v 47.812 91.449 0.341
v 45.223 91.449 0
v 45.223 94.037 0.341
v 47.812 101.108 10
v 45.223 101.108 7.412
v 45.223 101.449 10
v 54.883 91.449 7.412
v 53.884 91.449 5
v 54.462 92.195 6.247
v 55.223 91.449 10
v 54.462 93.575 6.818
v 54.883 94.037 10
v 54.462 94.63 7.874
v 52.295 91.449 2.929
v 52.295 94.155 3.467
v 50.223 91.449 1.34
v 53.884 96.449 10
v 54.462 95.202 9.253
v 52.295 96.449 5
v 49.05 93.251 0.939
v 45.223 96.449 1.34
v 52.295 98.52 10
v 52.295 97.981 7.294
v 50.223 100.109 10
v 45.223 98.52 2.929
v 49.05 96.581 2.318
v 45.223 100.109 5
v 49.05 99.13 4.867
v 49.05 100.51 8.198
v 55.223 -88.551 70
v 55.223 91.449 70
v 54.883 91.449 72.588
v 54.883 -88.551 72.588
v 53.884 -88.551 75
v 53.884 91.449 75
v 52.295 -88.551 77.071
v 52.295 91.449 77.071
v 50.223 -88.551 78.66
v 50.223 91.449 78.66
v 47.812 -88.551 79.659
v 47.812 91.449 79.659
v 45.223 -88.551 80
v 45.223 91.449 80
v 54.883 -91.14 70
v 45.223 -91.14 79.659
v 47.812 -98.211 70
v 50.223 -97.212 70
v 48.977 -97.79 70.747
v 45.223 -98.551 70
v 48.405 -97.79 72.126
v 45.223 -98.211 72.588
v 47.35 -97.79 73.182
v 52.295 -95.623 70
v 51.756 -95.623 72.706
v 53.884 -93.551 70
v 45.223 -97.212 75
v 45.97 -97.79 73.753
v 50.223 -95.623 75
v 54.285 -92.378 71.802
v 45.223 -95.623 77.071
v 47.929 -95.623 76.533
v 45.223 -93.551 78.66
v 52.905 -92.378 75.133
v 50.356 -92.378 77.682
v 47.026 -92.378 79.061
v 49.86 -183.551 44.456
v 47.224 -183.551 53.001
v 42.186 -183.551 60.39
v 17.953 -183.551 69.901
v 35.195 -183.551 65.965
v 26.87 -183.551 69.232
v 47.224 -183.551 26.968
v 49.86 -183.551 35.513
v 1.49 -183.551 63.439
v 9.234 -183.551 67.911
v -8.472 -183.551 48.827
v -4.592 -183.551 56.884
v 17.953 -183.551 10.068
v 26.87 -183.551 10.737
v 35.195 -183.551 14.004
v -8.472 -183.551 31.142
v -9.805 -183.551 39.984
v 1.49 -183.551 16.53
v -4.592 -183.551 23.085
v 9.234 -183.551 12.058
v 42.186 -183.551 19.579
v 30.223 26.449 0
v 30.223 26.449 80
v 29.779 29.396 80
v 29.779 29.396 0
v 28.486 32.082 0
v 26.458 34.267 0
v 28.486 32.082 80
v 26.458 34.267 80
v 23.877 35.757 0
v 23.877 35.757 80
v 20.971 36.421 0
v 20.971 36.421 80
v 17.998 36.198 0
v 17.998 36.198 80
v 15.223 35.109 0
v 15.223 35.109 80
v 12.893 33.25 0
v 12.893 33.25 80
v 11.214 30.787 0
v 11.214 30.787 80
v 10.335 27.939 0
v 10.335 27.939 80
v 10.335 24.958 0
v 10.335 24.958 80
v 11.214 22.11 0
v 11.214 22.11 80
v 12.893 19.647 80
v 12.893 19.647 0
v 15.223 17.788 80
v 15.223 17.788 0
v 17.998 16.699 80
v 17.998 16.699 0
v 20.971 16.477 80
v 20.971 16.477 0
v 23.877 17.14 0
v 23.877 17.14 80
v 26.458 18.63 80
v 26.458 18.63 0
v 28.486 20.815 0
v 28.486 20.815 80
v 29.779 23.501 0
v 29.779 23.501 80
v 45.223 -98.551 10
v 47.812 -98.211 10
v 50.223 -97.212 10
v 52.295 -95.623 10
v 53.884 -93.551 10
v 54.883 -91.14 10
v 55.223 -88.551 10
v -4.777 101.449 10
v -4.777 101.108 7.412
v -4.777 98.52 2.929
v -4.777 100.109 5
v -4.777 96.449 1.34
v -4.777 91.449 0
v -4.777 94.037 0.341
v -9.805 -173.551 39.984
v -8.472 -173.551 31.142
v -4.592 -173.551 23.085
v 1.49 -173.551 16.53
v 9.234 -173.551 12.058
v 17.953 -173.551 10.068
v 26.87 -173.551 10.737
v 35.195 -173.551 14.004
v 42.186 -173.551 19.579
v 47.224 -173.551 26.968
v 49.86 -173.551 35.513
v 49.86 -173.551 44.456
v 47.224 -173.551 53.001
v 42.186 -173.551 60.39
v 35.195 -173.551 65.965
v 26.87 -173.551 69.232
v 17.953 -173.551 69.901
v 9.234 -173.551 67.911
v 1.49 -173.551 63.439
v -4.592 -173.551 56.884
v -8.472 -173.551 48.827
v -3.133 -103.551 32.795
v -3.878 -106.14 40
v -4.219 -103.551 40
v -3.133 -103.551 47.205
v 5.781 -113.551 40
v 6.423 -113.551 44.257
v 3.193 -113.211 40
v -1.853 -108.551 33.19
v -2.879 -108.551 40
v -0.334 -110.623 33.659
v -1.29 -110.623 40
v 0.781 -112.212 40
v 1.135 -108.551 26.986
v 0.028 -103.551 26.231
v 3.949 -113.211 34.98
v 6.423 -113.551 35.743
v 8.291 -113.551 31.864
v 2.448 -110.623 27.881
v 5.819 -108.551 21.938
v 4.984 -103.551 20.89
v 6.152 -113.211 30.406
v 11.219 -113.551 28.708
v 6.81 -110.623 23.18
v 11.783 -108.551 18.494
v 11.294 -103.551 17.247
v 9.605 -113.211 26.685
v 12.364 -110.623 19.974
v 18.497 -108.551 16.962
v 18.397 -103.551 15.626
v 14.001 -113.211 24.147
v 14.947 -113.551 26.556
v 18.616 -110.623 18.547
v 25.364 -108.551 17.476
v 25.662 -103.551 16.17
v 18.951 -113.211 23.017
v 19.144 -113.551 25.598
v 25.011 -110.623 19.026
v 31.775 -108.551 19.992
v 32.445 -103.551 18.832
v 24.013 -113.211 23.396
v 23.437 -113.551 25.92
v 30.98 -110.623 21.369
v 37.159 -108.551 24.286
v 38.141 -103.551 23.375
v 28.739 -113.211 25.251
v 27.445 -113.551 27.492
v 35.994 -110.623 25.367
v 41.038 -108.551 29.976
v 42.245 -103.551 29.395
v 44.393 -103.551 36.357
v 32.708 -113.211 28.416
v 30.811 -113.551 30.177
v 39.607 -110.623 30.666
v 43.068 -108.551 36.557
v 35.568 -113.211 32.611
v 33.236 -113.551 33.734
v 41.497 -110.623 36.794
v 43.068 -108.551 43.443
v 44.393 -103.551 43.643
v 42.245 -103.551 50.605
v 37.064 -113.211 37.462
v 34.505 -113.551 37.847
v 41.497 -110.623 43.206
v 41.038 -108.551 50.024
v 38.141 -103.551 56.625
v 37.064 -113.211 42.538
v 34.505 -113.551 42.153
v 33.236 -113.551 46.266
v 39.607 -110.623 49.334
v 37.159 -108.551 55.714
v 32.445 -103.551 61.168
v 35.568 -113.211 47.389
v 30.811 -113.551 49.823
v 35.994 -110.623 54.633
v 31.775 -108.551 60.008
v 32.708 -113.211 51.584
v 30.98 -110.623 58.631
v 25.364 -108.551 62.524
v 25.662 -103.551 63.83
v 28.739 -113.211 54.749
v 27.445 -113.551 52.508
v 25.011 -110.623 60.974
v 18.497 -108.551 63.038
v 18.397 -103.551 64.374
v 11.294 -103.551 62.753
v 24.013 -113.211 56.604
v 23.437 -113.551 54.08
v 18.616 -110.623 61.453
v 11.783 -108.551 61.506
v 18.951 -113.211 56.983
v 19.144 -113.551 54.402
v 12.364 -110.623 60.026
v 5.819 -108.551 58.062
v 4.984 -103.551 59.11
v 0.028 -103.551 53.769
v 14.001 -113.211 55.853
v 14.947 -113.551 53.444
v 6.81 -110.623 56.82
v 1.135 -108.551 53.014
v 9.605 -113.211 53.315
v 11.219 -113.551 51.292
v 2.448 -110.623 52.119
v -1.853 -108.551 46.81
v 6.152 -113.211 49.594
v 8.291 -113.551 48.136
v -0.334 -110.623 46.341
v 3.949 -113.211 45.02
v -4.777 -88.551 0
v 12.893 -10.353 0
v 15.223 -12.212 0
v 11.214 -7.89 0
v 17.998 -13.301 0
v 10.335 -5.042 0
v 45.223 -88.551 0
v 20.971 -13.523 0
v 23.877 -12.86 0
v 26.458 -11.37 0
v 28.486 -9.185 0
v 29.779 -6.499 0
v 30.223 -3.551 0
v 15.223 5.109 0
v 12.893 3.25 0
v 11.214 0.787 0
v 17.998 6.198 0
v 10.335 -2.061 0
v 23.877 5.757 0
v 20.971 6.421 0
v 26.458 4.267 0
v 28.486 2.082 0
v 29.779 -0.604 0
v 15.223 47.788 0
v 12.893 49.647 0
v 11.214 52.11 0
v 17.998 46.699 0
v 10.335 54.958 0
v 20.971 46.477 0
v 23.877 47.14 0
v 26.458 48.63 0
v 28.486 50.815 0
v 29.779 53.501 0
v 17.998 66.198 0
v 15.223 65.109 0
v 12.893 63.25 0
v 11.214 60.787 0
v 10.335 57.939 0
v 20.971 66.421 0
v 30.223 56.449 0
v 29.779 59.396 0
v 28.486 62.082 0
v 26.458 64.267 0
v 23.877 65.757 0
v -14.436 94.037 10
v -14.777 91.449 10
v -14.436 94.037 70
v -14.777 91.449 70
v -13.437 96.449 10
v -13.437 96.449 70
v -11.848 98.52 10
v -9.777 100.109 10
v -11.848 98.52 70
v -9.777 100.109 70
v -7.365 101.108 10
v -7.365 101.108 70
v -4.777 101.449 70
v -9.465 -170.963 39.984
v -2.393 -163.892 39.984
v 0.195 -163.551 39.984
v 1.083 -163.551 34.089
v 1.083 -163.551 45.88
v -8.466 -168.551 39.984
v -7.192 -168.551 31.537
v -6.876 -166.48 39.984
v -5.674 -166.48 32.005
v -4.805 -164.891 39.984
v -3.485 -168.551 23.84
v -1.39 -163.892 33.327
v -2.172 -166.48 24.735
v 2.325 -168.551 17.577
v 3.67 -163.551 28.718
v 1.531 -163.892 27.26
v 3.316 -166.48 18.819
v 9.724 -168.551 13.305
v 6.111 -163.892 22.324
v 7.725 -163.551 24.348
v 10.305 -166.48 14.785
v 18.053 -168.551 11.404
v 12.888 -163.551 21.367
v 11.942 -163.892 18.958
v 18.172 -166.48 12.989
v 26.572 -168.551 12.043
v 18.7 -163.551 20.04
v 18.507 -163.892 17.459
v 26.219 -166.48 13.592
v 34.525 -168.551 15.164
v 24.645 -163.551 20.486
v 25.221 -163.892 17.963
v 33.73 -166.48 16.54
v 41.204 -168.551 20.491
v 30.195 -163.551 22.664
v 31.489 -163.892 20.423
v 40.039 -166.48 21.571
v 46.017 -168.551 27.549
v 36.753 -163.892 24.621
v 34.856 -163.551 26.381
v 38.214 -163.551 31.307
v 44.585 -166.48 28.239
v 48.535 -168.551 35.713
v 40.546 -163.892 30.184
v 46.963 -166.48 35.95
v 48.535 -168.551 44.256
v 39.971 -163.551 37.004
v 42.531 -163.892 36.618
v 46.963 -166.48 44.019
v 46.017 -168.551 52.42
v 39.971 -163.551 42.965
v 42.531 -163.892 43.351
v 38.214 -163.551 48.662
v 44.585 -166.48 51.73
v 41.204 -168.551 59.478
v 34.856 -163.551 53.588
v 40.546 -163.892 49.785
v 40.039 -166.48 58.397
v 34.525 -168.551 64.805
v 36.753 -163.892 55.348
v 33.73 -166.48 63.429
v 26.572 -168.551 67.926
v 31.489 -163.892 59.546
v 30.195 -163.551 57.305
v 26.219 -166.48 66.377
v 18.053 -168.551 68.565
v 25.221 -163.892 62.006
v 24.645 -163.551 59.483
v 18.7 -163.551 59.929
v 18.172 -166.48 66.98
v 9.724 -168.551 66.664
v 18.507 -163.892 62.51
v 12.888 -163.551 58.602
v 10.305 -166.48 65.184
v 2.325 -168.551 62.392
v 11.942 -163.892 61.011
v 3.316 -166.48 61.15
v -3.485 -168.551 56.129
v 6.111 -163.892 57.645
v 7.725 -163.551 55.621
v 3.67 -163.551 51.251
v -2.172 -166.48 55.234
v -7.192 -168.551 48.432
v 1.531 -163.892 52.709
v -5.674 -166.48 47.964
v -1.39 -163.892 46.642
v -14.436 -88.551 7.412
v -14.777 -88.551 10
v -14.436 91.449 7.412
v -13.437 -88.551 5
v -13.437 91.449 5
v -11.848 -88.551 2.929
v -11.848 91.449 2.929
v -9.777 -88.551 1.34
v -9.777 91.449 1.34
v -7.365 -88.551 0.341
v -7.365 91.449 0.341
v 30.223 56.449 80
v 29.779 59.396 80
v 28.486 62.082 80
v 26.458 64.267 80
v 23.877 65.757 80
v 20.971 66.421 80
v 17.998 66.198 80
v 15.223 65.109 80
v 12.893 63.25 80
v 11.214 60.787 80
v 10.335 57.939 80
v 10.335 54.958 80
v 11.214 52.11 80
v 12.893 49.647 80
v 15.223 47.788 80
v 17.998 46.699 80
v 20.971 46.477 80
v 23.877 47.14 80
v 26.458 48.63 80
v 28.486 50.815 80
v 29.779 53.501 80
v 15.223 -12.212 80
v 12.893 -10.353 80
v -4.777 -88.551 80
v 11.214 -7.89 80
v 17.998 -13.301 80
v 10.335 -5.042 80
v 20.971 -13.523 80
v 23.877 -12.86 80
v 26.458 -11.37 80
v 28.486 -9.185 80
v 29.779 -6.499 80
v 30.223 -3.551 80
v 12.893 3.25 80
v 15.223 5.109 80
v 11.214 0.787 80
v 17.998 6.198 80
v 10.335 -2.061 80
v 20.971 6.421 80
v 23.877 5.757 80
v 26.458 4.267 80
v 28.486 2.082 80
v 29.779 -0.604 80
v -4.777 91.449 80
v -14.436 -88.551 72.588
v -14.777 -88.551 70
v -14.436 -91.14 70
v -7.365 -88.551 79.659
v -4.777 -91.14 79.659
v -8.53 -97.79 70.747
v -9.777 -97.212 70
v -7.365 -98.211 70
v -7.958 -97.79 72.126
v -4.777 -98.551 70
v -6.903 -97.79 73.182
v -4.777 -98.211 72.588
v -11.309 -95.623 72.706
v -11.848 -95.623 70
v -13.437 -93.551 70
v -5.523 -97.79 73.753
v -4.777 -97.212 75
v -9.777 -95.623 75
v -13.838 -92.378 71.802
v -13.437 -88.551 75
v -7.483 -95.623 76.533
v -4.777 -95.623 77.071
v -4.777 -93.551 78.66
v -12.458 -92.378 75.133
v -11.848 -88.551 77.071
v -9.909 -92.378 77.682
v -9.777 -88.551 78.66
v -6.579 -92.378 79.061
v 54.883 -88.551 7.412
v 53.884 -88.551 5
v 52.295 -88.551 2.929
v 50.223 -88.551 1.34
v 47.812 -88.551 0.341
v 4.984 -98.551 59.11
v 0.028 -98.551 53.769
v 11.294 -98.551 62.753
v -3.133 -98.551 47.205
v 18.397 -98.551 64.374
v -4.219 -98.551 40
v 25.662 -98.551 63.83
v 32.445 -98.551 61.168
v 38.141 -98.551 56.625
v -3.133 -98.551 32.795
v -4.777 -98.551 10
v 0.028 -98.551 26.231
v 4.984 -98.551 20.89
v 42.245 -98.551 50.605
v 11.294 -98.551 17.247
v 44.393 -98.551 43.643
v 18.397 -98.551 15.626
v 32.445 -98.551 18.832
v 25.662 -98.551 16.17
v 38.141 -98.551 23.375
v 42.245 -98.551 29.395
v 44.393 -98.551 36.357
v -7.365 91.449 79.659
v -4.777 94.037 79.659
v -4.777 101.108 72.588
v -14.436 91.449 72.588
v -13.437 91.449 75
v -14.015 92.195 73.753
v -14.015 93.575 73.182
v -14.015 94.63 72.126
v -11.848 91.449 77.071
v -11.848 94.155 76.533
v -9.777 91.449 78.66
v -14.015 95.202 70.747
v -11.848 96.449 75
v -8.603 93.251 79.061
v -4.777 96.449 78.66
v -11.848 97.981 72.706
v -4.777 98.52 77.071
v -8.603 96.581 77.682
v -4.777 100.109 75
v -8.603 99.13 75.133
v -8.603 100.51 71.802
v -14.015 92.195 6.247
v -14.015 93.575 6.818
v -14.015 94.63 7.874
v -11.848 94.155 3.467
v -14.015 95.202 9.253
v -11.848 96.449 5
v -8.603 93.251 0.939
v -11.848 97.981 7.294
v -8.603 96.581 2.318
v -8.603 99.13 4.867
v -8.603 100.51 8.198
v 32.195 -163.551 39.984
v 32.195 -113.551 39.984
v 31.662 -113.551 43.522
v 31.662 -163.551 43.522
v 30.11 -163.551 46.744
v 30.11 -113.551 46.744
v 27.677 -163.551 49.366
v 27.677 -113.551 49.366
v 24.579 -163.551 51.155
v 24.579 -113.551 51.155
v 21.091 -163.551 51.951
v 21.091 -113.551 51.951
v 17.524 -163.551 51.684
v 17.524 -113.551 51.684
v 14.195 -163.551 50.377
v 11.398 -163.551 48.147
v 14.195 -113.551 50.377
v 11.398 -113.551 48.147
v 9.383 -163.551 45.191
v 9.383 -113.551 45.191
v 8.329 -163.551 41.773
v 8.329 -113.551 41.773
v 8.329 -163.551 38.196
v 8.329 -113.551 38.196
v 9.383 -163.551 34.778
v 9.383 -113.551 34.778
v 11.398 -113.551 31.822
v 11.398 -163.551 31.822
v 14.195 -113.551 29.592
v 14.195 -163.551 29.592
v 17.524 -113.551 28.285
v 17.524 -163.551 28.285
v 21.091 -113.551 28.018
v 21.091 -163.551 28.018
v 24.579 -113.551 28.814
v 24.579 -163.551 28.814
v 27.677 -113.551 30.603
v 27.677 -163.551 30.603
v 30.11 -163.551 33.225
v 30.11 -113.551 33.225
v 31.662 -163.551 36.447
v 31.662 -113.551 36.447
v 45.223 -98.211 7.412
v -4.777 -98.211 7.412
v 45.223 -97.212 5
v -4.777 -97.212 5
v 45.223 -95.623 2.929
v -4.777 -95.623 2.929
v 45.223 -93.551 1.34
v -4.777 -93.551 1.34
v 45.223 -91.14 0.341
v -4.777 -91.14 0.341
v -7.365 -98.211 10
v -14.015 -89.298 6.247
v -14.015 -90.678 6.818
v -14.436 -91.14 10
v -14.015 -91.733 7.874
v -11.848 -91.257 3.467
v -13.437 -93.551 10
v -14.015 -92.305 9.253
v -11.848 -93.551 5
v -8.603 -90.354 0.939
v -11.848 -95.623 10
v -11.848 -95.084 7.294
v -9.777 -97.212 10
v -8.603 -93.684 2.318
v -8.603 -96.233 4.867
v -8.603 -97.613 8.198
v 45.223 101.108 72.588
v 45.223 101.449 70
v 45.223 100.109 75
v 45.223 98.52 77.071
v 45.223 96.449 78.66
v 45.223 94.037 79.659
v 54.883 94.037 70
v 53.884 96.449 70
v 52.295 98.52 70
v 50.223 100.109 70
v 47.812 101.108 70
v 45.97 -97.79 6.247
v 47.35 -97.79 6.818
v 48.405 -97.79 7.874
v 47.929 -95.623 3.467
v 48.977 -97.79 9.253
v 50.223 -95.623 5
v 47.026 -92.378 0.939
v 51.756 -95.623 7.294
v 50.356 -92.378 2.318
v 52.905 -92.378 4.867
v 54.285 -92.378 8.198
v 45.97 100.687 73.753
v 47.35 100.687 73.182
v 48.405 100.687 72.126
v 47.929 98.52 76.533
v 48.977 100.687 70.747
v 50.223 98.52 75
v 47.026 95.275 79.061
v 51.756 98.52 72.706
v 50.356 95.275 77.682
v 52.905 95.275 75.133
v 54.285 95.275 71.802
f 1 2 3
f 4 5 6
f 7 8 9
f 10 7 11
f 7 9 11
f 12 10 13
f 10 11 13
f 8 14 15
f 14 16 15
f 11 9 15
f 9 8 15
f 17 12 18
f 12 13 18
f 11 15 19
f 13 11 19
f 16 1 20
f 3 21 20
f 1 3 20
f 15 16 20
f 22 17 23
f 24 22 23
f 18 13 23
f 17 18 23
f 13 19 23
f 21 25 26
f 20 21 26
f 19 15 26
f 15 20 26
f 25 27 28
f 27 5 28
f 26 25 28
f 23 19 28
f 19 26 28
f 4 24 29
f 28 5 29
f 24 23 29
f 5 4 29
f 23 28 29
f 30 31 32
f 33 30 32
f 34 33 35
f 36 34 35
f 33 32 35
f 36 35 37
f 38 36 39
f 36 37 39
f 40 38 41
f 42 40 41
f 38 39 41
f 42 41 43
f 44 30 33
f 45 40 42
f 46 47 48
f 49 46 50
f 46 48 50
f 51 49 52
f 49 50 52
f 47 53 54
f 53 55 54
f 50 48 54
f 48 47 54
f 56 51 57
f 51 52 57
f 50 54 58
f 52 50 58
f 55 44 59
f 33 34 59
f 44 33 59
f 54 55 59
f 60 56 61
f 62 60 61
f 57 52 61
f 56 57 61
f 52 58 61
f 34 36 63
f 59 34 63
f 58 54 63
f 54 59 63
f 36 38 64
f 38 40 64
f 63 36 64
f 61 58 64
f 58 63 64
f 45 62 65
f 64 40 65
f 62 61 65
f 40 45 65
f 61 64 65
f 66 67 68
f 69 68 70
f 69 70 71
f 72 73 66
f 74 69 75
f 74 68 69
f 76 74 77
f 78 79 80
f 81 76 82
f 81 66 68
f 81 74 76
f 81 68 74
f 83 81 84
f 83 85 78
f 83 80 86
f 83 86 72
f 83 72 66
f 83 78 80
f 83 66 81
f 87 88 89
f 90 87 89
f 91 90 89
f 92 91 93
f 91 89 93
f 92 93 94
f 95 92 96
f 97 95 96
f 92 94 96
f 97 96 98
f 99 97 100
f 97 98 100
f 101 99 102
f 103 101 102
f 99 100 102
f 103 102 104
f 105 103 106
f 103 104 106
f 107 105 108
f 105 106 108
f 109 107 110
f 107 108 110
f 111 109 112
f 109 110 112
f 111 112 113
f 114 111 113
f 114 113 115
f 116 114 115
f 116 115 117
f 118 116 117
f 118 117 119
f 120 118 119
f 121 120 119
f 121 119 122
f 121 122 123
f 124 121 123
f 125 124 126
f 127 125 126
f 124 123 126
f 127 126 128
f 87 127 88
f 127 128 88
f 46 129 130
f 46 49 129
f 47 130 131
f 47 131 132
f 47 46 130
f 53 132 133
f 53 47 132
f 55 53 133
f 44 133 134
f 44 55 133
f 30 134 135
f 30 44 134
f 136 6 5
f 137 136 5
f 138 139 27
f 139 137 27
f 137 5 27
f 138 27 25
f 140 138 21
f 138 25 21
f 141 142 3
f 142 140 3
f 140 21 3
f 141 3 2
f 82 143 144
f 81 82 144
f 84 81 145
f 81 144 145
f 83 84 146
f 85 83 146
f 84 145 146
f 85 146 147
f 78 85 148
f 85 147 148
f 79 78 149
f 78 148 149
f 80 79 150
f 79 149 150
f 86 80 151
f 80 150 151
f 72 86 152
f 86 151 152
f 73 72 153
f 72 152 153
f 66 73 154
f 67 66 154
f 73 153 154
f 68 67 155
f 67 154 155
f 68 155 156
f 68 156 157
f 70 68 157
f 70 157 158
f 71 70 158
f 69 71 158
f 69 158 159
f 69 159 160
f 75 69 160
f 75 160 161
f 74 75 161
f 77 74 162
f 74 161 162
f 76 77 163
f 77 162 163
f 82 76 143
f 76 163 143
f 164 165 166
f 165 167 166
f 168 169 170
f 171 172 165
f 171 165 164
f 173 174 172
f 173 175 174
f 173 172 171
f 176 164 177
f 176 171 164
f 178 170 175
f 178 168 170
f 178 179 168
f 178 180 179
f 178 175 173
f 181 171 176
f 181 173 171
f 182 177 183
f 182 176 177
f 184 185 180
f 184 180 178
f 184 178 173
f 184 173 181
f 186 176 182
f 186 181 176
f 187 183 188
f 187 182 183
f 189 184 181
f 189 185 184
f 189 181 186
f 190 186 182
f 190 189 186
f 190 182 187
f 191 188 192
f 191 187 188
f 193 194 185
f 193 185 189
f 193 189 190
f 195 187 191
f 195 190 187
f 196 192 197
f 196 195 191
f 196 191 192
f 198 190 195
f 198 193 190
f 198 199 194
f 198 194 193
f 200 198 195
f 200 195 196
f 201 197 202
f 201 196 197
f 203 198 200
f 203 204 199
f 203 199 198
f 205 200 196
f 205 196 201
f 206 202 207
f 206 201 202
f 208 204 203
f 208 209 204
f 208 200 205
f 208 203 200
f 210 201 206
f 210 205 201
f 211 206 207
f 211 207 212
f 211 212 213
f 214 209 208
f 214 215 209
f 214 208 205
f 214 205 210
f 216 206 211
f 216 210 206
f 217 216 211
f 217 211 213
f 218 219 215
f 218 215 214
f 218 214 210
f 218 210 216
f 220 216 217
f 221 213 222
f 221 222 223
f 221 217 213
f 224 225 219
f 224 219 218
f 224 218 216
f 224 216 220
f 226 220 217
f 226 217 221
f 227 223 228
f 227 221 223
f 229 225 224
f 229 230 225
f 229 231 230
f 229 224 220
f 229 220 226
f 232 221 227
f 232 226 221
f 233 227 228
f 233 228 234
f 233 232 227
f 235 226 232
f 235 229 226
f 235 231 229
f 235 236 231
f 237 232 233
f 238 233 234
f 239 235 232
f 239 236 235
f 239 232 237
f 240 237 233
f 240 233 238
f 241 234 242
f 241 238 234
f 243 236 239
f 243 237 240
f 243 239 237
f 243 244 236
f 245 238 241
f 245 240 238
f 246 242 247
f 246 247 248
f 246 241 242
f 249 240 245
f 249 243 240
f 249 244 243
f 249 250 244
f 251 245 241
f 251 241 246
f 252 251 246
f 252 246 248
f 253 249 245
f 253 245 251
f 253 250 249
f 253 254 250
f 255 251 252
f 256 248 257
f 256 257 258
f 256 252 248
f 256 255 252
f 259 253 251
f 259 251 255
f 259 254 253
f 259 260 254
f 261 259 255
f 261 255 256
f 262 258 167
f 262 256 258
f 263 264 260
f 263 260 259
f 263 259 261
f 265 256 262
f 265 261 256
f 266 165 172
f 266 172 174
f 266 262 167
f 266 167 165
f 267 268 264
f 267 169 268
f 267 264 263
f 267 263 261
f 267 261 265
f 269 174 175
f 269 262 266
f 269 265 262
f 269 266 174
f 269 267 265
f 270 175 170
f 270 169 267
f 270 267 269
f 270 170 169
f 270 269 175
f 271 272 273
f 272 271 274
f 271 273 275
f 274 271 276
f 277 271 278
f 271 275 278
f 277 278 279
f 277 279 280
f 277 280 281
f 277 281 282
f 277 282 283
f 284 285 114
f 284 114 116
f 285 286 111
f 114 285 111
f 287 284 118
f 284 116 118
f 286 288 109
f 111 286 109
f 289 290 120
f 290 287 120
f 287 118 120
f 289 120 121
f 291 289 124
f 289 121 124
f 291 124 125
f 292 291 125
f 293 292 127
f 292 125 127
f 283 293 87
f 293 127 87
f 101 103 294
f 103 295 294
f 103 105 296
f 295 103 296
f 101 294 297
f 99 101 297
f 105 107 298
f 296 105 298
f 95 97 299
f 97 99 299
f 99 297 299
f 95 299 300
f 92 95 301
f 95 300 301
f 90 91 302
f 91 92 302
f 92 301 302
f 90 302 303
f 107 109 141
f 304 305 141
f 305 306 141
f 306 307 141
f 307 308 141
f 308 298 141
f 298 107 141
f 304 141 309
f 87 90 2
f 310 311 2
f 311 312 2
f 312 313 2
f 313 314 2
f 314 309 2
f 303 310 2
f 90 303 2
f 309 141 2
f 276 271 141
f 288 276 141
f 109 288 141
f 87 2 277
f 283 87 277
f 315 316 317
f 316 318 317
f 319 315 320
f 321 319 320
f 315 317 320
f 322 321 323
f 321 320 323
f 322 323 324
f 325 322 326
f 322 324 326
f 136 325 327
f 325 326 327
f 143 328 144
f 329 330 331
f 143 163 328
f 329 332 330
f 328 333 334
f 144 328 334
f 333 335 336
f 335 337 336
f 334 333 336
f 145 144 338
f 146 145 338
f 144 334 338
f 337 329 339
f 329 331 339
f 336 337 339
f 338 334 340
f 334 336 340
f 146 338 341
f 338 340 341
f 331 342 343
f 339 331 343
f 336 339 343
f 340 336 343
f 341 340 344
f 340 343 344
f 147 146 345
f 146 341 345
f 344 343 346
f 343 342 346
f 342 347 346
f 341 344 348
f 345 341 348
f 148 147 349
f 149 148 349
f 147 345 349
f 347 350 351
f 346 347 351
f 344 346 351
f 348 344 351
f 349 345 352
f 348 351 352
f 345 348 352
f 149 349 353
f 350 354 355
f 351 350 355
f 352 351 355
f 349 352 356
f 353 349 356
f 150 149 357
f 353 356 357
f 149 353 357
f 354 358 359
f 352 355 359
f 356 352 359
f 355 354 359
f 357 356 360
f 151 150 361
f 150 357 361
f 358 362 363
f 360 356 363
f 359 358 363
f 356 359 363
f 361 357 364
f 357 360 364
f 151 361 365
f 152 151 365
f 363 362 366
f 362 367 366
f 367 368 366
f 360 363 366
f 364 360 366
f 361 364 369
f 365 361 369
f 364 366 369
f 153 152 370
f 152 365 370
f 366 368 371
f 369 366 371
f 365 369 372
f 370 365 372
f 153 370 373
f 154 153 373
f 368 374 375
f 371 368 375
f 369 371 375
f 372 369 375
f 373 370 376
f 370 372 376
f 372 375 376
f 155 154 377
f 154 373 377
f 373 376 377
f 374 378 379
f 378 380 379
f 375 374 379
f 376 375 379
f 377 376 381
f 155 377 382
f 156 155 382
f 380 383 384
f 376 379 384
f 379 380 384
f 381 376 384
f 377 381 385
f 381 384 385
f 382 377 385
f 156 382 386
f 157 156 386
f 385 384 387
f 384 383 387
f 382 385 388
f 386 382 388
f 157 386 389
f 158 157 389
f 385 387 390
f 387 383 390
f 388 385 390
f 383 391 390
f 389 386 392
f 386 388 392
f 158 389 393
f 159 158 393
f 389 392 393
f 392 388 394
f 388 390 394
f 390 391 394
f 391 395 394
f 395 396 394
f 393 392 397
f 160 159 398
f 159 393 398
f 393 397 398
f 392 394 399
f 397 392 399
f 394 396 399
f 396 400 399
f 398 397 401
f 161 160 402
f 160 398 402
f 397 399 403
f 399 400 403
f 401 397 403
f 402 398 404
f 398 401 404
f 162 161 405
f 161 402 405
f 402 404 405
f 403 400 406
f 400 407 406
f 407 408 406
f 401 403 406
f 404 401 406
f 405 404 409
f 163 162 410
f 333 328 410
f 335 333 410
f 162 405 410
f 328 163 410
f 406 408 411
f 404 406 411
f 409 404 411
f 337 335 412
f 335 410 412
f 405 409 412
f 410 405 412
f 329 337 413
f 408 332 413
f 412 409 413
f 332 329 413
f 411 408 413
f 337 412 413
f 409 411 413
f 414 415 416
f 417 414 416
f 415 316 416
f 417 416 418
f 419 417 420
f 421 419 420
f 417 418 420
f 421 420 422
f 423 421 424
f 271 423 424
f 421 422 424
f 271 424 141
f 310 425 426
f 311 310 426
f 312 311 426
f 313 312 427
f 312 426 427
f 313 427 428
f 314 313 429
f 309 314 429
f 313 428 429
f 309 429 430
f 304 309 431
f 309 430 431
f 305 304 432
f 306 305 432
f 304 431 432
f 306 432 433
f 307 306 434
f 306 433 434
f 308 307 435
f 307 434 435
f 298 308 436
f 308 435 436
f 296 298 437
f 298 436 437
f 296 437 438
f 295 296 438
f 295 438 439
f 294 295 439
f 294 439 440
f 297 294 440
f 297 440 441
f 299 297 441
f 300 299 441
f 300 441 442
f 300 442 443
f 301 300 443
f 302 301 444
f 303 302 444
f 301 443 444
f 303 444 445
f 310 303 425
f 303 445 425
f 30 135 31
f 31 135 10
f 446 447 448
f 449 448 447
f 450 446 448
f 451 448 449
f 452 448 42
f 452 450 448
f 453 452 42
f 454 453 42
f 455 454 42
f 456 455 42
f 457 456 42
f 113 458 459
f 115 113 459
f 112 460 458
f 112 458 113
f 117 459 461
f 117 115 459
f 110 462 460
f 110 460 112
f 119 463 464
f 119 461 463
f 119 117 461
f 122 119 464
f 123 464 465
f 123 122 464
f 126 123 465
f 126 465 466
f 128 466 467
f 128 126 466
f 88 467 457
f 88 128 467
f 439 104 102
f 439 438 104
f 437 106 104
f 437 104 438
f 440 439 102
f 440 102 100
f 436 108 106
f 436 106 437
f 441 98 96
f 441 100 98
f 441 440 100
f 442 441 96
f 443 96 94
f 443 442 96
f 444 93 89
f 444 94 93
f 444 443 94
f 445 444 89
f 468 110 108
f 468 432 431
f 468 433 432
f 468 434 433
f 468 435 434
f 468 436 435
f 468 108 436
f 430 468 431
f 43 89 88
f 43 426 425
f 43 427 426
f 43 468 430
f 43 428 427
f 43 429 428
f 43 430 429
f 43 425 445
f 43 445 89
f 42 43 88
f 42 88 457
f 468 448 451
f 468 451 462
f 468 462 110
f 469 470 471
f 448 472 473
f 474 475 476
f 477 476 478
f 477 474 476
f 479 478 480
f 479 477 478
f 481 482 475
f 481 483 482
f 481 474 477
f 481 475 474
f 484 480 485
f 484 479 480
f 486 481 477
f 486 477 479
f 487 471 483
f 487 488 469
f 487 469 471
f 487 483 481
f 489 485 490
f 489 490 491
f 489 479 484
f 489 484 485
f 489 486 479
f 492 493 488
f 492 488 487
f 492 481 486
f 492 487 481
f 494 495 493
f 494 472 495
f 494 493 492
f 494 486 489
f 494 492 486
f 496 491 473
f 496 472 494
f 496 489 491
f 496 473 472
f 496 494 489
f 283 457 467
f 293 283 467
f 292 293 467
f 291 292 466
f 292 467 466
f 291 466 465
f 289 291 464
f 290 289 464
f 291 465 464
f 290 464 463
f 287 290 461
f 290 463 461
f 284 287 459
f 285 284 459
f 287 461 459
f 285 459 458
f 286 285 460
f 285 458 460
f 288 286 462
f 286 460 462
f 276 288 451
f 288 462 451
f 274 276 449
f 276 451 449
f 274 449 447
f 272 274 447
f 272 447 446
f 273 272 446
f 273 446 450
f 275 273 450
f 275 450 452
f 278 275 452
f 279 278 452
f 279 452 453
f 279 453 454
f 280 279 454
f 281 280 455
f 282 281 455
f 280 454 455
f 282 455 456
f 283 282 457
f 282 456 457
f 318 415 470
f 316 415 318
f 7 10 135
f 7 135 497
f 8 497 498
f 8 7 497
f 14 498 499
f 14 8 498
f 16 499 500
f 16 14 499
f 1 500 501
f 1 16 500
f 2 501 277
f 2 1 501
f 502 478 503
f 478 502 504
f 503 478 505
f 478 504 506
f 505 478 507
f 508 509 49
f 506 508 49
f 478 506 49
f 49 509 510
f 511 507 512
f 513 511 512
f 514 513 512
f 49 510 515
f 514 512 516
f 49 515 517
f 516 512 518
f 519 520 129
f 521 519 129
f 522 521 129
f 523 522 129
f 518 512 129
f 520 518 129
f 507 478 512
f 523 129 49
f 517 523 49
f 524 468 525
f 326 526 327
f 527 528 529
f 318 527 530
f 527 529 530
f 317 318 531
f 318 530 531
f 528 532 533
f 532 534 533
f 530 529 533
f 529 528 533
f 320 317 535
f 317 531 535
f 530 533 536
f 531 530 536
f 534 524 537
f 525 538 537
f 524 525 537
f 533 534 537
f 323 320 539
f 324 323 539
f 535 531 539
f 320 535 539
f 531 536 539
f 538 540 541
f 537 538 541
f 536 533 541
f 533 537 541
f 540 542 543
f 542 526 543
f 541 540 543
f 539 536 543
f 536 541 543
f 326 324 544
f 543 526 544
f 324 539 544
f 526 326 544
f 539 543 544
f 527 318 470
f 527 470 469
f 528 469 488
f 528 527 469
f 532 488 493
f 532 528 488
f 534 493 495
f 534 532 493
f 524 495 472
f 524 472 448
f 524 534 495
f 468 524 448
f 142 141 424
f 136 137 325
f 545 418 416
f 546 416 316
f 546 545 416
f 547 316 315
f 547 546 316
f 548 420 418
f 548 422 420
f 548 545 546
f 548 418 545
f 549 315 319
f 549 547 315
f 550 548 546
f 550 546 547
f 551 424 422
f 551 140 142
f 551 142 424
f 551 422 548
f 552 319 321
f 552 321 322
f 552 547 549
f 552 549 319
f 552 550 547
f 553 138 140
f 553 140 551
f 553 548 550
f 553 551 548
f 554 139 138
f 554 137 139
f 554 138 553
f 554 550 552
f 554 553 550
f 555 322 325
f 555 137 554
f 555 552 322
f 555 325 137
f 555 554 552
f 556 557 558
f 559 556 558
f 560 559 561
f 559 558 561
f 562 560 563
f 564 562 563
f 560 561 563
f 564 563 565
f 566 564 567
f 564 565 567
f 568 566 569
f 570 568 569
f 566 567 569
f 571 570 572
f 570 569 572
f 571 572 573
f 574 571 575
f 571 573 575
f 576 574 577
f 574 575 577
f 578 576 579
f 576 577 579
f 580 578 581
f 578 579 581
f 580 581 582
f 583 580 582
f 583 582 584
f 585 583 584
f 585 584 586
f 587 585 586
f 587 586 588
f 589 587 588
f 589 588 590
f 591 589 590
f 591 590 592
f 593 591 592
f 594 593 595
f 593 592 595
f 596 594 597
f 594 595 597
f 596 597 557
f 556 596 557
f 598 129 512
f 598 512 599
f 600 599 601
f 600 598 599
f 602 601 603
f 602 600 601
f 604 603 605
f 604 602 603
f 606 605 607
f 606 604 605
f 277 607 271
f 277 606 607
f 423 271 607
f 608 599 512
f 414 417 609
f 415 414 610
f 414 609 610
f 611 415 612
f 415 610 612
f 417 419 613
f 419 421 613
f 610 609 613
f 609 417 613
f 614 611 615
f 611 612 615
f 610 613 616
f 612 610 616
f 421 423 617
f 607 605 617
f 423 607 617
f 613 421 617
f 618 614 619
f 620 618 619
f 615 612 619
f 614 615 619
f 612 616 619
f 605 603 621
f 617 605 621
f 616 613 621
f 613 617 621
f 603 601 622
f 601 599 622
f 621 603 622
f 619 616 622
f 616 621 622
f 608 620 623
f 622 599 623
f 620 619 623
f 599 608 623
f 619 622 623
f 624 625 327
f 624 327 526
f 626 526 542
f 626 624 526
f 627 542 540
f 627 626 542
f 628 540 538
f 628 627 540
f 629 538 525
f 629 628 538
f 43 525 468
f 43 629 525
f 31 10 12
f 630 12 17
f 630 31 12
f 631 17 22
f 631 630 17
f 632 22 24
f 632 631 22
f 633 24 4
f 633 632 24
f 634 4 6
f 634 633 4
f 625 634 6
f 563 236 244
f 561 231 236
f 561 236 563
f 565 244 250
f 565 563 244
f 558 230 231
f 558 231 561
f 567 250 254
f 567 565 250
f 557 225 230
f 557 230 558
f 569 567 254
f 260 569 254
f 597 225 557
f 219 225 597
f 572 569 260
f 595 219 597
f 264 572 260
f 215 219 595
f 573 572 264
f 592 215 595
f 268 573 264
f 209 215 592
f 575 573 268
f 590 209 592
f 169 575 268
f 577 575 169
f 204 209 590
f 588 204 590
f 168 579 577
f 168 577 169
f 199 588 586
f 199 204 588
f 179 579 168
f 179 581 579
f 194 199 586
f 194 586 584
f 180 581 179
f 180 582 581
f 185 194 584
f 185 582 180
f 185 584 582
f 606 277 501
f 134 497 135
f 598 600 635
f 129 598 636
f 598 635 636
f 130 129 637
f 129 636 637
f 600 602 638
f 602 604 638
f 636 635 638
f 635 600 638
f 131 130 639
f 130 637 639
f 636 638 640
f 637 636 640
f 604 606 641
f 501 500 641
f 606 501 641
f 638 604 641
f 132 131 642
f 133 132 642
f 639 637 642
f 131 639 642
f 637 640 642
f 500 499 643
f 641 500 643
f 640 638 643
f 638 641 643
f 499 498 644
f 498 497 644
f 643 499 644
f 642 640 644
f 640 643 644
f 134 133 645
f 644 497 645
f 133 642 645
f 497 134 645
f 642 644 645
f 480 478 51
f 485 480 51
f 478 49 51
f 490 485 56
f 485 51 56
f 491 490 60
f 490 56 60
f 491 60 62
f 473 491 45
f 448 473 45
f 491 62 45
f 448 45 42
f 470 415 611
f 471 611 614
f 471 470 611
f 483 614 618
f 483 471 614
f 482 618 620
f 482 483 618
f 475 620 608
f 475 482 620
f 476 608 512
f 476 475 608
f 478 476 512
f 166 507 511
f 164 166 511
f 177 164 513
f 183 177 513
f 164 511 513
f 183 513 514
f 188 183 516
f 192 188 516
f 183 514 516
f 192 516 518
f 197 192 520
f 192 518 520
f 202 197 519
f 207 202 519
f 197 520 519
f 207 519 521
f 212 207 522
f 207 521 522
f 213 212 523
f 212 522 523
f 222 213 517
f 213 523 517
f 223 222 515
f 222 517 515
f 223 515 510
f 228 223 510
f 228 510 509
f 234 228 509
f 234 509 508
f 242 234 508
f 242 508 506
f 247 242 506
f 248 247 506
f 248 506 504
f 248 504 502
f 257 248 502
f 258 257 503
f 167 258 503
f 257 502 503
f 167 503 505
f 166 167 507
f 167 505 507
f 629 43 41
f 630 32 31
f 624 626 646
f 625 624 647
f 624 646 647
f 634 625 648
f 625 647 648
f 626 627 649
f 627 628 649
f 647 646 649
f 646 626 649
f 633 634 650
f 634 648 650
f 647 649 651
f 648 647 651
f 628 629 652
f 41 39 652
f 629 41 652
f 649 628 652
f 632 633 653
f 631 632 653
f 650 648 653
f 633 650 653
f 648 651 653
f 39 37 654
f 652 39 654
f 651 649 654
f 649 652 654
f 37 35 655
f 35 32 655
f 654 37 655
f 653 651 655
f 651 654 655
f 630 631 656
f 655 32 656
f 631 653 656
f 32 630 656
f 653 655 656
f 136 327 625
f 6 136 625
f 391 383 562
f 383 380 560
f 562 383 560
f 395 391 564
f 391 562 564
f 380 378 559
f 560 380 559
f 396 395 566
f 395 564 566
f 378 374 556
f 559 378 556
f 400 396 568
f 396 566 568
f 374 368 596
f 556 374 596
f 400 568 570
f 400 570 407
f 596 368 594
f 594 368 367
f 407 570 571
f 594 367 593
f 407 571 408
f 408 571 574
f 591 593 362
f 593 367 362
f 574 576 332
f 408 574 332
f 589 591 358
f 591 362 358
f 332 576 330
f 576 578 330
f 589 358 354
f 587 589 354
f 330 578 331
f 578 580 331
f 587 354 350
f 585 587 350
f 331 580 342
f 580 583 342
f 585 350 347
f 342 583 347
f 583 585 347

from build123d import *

# Parameters (mm, degrees)
SKETCH1_W           = 70
SKETCH1_H           = 200
BOSS_EXTRUDE1_DEPTH = 80
FILLET1_R           = 10
SKETCH2_R           = 24.442521079
BOSS_EXTRUDE2_DEPTH = 15
FILLET3_R           = 10
SKETCH3_R           = 12
BOSS_EXTRUDE3_DEPTH = 50
SKETCH4_R           = 30
BOSS_EXTRUDE4_DEPTH = 20
FILLET4_R           = 10
SKETCH5_R           = 10
CUT_EXTRUDE1_DEPTH  = 80


with BuildPart() as part:
    # Sketch1 → Boss-Extrude1 (new body)
    with BuildSketch(Plane.XY):
        with Locations((20.223475334, 1.448561813)):
            Rectangle(SKETCH1_W, SKETCH1_H)
    extrude(amount=BOSS_EXTRUDE1_DEPTH)

    # Fillet1
    fillet1_edges = [part.edges().sort_by_distance(p)[0] for p in [
        (55.223475334, 1.448561813, 80),
        (20.223475334, 101.448561813, 80),
        (-14.776524666, 1.448561813, 80),
        (20.223475334, 101.448561813, 0),
        (55.223475334, 1.448561813, 0),
        (20.223475334, -98.551438187, 0),
        (-14.776524666, 1.448561813, 0),
        (-14.776524666, 101.448561813, 40),
        (55.223475334, 101.448561813, 40),
        (55.223475334, -98.551438187, 40),
        (-14.776524666, -98.551438187, 40),
        (20.223475334, -98.551438187, 80),
    ]]
    fillet(fillet1_edges, radius=FILLET1_R)

    # Sketch2 → Boss-Extrude2 (add)
    with BuildSketch(Plane(origin=(0, -98.551438187, 0), x_dir=(-1, 0, 0), z_dir=(0, -1, 0))):
        with Locations((-20.223475334, -40)):
            Circle(SKETCH2_R)
    extrude(amount=BOSS_EXTRUDE2_DEPTH)

    # Fillet3
    fillet3_edges = [part.edges().sort_by_distance(p)[0] for p in [
        (44.665996414, -113.551438187, 40),
    ]]
    fillet(fillet3_edges, radius=FILLET3_R)

    # Sketch3 → Boss-Extrude3 (add)
    with BuildSketch(Plane.XZ.offset(113.551438187)):
        with Locations((20.19472106, 39.984491152)):
            Circle(SKETCH3_R)
    extrude(amount=BOSS_EXTRUDE3_DEPTH)

    # Sketch4 → Boss-Extrude4 (add)
    with BuildSketch(Plane(origin=(0, -163.551438187, 0), x_dir=(-1, 0, 0), z_dir=(0, -1, 0))):
        with Locations((-20.19472106, -39.984491152)):
            Circle(SKETCH4_R)
    extrude(amount=BOSS_EXTRUDE4_DEPTH)

    # Fillet4
    fillet4_edges = [part.edges().sort_by_distance(p)[0] for p in [
        (50.19472106, -163.551438187, 39.984491152),
    ]]
    fillet(fillet4_edges, radius=FILLET4_R)

    # Sketch5 → Cut-Extrude1 (cut)
    with BuildSketch(Plane.XY.offset(80)):
        with Locations((20.223475334, 56.448561813)):
            Circle(SKETCH5_R)
        with Locations((20.223475334, 26.448561813)):
            Circle(SKETCH5_R)
        with Locations((20.223475334, -3.551438187)):
            Circle(SKETCH5_R)
    extrude(amount=-CUT_EXTRUDE1_DEPTH, mode=Mode.SUBTRACT)


solid = part.part
